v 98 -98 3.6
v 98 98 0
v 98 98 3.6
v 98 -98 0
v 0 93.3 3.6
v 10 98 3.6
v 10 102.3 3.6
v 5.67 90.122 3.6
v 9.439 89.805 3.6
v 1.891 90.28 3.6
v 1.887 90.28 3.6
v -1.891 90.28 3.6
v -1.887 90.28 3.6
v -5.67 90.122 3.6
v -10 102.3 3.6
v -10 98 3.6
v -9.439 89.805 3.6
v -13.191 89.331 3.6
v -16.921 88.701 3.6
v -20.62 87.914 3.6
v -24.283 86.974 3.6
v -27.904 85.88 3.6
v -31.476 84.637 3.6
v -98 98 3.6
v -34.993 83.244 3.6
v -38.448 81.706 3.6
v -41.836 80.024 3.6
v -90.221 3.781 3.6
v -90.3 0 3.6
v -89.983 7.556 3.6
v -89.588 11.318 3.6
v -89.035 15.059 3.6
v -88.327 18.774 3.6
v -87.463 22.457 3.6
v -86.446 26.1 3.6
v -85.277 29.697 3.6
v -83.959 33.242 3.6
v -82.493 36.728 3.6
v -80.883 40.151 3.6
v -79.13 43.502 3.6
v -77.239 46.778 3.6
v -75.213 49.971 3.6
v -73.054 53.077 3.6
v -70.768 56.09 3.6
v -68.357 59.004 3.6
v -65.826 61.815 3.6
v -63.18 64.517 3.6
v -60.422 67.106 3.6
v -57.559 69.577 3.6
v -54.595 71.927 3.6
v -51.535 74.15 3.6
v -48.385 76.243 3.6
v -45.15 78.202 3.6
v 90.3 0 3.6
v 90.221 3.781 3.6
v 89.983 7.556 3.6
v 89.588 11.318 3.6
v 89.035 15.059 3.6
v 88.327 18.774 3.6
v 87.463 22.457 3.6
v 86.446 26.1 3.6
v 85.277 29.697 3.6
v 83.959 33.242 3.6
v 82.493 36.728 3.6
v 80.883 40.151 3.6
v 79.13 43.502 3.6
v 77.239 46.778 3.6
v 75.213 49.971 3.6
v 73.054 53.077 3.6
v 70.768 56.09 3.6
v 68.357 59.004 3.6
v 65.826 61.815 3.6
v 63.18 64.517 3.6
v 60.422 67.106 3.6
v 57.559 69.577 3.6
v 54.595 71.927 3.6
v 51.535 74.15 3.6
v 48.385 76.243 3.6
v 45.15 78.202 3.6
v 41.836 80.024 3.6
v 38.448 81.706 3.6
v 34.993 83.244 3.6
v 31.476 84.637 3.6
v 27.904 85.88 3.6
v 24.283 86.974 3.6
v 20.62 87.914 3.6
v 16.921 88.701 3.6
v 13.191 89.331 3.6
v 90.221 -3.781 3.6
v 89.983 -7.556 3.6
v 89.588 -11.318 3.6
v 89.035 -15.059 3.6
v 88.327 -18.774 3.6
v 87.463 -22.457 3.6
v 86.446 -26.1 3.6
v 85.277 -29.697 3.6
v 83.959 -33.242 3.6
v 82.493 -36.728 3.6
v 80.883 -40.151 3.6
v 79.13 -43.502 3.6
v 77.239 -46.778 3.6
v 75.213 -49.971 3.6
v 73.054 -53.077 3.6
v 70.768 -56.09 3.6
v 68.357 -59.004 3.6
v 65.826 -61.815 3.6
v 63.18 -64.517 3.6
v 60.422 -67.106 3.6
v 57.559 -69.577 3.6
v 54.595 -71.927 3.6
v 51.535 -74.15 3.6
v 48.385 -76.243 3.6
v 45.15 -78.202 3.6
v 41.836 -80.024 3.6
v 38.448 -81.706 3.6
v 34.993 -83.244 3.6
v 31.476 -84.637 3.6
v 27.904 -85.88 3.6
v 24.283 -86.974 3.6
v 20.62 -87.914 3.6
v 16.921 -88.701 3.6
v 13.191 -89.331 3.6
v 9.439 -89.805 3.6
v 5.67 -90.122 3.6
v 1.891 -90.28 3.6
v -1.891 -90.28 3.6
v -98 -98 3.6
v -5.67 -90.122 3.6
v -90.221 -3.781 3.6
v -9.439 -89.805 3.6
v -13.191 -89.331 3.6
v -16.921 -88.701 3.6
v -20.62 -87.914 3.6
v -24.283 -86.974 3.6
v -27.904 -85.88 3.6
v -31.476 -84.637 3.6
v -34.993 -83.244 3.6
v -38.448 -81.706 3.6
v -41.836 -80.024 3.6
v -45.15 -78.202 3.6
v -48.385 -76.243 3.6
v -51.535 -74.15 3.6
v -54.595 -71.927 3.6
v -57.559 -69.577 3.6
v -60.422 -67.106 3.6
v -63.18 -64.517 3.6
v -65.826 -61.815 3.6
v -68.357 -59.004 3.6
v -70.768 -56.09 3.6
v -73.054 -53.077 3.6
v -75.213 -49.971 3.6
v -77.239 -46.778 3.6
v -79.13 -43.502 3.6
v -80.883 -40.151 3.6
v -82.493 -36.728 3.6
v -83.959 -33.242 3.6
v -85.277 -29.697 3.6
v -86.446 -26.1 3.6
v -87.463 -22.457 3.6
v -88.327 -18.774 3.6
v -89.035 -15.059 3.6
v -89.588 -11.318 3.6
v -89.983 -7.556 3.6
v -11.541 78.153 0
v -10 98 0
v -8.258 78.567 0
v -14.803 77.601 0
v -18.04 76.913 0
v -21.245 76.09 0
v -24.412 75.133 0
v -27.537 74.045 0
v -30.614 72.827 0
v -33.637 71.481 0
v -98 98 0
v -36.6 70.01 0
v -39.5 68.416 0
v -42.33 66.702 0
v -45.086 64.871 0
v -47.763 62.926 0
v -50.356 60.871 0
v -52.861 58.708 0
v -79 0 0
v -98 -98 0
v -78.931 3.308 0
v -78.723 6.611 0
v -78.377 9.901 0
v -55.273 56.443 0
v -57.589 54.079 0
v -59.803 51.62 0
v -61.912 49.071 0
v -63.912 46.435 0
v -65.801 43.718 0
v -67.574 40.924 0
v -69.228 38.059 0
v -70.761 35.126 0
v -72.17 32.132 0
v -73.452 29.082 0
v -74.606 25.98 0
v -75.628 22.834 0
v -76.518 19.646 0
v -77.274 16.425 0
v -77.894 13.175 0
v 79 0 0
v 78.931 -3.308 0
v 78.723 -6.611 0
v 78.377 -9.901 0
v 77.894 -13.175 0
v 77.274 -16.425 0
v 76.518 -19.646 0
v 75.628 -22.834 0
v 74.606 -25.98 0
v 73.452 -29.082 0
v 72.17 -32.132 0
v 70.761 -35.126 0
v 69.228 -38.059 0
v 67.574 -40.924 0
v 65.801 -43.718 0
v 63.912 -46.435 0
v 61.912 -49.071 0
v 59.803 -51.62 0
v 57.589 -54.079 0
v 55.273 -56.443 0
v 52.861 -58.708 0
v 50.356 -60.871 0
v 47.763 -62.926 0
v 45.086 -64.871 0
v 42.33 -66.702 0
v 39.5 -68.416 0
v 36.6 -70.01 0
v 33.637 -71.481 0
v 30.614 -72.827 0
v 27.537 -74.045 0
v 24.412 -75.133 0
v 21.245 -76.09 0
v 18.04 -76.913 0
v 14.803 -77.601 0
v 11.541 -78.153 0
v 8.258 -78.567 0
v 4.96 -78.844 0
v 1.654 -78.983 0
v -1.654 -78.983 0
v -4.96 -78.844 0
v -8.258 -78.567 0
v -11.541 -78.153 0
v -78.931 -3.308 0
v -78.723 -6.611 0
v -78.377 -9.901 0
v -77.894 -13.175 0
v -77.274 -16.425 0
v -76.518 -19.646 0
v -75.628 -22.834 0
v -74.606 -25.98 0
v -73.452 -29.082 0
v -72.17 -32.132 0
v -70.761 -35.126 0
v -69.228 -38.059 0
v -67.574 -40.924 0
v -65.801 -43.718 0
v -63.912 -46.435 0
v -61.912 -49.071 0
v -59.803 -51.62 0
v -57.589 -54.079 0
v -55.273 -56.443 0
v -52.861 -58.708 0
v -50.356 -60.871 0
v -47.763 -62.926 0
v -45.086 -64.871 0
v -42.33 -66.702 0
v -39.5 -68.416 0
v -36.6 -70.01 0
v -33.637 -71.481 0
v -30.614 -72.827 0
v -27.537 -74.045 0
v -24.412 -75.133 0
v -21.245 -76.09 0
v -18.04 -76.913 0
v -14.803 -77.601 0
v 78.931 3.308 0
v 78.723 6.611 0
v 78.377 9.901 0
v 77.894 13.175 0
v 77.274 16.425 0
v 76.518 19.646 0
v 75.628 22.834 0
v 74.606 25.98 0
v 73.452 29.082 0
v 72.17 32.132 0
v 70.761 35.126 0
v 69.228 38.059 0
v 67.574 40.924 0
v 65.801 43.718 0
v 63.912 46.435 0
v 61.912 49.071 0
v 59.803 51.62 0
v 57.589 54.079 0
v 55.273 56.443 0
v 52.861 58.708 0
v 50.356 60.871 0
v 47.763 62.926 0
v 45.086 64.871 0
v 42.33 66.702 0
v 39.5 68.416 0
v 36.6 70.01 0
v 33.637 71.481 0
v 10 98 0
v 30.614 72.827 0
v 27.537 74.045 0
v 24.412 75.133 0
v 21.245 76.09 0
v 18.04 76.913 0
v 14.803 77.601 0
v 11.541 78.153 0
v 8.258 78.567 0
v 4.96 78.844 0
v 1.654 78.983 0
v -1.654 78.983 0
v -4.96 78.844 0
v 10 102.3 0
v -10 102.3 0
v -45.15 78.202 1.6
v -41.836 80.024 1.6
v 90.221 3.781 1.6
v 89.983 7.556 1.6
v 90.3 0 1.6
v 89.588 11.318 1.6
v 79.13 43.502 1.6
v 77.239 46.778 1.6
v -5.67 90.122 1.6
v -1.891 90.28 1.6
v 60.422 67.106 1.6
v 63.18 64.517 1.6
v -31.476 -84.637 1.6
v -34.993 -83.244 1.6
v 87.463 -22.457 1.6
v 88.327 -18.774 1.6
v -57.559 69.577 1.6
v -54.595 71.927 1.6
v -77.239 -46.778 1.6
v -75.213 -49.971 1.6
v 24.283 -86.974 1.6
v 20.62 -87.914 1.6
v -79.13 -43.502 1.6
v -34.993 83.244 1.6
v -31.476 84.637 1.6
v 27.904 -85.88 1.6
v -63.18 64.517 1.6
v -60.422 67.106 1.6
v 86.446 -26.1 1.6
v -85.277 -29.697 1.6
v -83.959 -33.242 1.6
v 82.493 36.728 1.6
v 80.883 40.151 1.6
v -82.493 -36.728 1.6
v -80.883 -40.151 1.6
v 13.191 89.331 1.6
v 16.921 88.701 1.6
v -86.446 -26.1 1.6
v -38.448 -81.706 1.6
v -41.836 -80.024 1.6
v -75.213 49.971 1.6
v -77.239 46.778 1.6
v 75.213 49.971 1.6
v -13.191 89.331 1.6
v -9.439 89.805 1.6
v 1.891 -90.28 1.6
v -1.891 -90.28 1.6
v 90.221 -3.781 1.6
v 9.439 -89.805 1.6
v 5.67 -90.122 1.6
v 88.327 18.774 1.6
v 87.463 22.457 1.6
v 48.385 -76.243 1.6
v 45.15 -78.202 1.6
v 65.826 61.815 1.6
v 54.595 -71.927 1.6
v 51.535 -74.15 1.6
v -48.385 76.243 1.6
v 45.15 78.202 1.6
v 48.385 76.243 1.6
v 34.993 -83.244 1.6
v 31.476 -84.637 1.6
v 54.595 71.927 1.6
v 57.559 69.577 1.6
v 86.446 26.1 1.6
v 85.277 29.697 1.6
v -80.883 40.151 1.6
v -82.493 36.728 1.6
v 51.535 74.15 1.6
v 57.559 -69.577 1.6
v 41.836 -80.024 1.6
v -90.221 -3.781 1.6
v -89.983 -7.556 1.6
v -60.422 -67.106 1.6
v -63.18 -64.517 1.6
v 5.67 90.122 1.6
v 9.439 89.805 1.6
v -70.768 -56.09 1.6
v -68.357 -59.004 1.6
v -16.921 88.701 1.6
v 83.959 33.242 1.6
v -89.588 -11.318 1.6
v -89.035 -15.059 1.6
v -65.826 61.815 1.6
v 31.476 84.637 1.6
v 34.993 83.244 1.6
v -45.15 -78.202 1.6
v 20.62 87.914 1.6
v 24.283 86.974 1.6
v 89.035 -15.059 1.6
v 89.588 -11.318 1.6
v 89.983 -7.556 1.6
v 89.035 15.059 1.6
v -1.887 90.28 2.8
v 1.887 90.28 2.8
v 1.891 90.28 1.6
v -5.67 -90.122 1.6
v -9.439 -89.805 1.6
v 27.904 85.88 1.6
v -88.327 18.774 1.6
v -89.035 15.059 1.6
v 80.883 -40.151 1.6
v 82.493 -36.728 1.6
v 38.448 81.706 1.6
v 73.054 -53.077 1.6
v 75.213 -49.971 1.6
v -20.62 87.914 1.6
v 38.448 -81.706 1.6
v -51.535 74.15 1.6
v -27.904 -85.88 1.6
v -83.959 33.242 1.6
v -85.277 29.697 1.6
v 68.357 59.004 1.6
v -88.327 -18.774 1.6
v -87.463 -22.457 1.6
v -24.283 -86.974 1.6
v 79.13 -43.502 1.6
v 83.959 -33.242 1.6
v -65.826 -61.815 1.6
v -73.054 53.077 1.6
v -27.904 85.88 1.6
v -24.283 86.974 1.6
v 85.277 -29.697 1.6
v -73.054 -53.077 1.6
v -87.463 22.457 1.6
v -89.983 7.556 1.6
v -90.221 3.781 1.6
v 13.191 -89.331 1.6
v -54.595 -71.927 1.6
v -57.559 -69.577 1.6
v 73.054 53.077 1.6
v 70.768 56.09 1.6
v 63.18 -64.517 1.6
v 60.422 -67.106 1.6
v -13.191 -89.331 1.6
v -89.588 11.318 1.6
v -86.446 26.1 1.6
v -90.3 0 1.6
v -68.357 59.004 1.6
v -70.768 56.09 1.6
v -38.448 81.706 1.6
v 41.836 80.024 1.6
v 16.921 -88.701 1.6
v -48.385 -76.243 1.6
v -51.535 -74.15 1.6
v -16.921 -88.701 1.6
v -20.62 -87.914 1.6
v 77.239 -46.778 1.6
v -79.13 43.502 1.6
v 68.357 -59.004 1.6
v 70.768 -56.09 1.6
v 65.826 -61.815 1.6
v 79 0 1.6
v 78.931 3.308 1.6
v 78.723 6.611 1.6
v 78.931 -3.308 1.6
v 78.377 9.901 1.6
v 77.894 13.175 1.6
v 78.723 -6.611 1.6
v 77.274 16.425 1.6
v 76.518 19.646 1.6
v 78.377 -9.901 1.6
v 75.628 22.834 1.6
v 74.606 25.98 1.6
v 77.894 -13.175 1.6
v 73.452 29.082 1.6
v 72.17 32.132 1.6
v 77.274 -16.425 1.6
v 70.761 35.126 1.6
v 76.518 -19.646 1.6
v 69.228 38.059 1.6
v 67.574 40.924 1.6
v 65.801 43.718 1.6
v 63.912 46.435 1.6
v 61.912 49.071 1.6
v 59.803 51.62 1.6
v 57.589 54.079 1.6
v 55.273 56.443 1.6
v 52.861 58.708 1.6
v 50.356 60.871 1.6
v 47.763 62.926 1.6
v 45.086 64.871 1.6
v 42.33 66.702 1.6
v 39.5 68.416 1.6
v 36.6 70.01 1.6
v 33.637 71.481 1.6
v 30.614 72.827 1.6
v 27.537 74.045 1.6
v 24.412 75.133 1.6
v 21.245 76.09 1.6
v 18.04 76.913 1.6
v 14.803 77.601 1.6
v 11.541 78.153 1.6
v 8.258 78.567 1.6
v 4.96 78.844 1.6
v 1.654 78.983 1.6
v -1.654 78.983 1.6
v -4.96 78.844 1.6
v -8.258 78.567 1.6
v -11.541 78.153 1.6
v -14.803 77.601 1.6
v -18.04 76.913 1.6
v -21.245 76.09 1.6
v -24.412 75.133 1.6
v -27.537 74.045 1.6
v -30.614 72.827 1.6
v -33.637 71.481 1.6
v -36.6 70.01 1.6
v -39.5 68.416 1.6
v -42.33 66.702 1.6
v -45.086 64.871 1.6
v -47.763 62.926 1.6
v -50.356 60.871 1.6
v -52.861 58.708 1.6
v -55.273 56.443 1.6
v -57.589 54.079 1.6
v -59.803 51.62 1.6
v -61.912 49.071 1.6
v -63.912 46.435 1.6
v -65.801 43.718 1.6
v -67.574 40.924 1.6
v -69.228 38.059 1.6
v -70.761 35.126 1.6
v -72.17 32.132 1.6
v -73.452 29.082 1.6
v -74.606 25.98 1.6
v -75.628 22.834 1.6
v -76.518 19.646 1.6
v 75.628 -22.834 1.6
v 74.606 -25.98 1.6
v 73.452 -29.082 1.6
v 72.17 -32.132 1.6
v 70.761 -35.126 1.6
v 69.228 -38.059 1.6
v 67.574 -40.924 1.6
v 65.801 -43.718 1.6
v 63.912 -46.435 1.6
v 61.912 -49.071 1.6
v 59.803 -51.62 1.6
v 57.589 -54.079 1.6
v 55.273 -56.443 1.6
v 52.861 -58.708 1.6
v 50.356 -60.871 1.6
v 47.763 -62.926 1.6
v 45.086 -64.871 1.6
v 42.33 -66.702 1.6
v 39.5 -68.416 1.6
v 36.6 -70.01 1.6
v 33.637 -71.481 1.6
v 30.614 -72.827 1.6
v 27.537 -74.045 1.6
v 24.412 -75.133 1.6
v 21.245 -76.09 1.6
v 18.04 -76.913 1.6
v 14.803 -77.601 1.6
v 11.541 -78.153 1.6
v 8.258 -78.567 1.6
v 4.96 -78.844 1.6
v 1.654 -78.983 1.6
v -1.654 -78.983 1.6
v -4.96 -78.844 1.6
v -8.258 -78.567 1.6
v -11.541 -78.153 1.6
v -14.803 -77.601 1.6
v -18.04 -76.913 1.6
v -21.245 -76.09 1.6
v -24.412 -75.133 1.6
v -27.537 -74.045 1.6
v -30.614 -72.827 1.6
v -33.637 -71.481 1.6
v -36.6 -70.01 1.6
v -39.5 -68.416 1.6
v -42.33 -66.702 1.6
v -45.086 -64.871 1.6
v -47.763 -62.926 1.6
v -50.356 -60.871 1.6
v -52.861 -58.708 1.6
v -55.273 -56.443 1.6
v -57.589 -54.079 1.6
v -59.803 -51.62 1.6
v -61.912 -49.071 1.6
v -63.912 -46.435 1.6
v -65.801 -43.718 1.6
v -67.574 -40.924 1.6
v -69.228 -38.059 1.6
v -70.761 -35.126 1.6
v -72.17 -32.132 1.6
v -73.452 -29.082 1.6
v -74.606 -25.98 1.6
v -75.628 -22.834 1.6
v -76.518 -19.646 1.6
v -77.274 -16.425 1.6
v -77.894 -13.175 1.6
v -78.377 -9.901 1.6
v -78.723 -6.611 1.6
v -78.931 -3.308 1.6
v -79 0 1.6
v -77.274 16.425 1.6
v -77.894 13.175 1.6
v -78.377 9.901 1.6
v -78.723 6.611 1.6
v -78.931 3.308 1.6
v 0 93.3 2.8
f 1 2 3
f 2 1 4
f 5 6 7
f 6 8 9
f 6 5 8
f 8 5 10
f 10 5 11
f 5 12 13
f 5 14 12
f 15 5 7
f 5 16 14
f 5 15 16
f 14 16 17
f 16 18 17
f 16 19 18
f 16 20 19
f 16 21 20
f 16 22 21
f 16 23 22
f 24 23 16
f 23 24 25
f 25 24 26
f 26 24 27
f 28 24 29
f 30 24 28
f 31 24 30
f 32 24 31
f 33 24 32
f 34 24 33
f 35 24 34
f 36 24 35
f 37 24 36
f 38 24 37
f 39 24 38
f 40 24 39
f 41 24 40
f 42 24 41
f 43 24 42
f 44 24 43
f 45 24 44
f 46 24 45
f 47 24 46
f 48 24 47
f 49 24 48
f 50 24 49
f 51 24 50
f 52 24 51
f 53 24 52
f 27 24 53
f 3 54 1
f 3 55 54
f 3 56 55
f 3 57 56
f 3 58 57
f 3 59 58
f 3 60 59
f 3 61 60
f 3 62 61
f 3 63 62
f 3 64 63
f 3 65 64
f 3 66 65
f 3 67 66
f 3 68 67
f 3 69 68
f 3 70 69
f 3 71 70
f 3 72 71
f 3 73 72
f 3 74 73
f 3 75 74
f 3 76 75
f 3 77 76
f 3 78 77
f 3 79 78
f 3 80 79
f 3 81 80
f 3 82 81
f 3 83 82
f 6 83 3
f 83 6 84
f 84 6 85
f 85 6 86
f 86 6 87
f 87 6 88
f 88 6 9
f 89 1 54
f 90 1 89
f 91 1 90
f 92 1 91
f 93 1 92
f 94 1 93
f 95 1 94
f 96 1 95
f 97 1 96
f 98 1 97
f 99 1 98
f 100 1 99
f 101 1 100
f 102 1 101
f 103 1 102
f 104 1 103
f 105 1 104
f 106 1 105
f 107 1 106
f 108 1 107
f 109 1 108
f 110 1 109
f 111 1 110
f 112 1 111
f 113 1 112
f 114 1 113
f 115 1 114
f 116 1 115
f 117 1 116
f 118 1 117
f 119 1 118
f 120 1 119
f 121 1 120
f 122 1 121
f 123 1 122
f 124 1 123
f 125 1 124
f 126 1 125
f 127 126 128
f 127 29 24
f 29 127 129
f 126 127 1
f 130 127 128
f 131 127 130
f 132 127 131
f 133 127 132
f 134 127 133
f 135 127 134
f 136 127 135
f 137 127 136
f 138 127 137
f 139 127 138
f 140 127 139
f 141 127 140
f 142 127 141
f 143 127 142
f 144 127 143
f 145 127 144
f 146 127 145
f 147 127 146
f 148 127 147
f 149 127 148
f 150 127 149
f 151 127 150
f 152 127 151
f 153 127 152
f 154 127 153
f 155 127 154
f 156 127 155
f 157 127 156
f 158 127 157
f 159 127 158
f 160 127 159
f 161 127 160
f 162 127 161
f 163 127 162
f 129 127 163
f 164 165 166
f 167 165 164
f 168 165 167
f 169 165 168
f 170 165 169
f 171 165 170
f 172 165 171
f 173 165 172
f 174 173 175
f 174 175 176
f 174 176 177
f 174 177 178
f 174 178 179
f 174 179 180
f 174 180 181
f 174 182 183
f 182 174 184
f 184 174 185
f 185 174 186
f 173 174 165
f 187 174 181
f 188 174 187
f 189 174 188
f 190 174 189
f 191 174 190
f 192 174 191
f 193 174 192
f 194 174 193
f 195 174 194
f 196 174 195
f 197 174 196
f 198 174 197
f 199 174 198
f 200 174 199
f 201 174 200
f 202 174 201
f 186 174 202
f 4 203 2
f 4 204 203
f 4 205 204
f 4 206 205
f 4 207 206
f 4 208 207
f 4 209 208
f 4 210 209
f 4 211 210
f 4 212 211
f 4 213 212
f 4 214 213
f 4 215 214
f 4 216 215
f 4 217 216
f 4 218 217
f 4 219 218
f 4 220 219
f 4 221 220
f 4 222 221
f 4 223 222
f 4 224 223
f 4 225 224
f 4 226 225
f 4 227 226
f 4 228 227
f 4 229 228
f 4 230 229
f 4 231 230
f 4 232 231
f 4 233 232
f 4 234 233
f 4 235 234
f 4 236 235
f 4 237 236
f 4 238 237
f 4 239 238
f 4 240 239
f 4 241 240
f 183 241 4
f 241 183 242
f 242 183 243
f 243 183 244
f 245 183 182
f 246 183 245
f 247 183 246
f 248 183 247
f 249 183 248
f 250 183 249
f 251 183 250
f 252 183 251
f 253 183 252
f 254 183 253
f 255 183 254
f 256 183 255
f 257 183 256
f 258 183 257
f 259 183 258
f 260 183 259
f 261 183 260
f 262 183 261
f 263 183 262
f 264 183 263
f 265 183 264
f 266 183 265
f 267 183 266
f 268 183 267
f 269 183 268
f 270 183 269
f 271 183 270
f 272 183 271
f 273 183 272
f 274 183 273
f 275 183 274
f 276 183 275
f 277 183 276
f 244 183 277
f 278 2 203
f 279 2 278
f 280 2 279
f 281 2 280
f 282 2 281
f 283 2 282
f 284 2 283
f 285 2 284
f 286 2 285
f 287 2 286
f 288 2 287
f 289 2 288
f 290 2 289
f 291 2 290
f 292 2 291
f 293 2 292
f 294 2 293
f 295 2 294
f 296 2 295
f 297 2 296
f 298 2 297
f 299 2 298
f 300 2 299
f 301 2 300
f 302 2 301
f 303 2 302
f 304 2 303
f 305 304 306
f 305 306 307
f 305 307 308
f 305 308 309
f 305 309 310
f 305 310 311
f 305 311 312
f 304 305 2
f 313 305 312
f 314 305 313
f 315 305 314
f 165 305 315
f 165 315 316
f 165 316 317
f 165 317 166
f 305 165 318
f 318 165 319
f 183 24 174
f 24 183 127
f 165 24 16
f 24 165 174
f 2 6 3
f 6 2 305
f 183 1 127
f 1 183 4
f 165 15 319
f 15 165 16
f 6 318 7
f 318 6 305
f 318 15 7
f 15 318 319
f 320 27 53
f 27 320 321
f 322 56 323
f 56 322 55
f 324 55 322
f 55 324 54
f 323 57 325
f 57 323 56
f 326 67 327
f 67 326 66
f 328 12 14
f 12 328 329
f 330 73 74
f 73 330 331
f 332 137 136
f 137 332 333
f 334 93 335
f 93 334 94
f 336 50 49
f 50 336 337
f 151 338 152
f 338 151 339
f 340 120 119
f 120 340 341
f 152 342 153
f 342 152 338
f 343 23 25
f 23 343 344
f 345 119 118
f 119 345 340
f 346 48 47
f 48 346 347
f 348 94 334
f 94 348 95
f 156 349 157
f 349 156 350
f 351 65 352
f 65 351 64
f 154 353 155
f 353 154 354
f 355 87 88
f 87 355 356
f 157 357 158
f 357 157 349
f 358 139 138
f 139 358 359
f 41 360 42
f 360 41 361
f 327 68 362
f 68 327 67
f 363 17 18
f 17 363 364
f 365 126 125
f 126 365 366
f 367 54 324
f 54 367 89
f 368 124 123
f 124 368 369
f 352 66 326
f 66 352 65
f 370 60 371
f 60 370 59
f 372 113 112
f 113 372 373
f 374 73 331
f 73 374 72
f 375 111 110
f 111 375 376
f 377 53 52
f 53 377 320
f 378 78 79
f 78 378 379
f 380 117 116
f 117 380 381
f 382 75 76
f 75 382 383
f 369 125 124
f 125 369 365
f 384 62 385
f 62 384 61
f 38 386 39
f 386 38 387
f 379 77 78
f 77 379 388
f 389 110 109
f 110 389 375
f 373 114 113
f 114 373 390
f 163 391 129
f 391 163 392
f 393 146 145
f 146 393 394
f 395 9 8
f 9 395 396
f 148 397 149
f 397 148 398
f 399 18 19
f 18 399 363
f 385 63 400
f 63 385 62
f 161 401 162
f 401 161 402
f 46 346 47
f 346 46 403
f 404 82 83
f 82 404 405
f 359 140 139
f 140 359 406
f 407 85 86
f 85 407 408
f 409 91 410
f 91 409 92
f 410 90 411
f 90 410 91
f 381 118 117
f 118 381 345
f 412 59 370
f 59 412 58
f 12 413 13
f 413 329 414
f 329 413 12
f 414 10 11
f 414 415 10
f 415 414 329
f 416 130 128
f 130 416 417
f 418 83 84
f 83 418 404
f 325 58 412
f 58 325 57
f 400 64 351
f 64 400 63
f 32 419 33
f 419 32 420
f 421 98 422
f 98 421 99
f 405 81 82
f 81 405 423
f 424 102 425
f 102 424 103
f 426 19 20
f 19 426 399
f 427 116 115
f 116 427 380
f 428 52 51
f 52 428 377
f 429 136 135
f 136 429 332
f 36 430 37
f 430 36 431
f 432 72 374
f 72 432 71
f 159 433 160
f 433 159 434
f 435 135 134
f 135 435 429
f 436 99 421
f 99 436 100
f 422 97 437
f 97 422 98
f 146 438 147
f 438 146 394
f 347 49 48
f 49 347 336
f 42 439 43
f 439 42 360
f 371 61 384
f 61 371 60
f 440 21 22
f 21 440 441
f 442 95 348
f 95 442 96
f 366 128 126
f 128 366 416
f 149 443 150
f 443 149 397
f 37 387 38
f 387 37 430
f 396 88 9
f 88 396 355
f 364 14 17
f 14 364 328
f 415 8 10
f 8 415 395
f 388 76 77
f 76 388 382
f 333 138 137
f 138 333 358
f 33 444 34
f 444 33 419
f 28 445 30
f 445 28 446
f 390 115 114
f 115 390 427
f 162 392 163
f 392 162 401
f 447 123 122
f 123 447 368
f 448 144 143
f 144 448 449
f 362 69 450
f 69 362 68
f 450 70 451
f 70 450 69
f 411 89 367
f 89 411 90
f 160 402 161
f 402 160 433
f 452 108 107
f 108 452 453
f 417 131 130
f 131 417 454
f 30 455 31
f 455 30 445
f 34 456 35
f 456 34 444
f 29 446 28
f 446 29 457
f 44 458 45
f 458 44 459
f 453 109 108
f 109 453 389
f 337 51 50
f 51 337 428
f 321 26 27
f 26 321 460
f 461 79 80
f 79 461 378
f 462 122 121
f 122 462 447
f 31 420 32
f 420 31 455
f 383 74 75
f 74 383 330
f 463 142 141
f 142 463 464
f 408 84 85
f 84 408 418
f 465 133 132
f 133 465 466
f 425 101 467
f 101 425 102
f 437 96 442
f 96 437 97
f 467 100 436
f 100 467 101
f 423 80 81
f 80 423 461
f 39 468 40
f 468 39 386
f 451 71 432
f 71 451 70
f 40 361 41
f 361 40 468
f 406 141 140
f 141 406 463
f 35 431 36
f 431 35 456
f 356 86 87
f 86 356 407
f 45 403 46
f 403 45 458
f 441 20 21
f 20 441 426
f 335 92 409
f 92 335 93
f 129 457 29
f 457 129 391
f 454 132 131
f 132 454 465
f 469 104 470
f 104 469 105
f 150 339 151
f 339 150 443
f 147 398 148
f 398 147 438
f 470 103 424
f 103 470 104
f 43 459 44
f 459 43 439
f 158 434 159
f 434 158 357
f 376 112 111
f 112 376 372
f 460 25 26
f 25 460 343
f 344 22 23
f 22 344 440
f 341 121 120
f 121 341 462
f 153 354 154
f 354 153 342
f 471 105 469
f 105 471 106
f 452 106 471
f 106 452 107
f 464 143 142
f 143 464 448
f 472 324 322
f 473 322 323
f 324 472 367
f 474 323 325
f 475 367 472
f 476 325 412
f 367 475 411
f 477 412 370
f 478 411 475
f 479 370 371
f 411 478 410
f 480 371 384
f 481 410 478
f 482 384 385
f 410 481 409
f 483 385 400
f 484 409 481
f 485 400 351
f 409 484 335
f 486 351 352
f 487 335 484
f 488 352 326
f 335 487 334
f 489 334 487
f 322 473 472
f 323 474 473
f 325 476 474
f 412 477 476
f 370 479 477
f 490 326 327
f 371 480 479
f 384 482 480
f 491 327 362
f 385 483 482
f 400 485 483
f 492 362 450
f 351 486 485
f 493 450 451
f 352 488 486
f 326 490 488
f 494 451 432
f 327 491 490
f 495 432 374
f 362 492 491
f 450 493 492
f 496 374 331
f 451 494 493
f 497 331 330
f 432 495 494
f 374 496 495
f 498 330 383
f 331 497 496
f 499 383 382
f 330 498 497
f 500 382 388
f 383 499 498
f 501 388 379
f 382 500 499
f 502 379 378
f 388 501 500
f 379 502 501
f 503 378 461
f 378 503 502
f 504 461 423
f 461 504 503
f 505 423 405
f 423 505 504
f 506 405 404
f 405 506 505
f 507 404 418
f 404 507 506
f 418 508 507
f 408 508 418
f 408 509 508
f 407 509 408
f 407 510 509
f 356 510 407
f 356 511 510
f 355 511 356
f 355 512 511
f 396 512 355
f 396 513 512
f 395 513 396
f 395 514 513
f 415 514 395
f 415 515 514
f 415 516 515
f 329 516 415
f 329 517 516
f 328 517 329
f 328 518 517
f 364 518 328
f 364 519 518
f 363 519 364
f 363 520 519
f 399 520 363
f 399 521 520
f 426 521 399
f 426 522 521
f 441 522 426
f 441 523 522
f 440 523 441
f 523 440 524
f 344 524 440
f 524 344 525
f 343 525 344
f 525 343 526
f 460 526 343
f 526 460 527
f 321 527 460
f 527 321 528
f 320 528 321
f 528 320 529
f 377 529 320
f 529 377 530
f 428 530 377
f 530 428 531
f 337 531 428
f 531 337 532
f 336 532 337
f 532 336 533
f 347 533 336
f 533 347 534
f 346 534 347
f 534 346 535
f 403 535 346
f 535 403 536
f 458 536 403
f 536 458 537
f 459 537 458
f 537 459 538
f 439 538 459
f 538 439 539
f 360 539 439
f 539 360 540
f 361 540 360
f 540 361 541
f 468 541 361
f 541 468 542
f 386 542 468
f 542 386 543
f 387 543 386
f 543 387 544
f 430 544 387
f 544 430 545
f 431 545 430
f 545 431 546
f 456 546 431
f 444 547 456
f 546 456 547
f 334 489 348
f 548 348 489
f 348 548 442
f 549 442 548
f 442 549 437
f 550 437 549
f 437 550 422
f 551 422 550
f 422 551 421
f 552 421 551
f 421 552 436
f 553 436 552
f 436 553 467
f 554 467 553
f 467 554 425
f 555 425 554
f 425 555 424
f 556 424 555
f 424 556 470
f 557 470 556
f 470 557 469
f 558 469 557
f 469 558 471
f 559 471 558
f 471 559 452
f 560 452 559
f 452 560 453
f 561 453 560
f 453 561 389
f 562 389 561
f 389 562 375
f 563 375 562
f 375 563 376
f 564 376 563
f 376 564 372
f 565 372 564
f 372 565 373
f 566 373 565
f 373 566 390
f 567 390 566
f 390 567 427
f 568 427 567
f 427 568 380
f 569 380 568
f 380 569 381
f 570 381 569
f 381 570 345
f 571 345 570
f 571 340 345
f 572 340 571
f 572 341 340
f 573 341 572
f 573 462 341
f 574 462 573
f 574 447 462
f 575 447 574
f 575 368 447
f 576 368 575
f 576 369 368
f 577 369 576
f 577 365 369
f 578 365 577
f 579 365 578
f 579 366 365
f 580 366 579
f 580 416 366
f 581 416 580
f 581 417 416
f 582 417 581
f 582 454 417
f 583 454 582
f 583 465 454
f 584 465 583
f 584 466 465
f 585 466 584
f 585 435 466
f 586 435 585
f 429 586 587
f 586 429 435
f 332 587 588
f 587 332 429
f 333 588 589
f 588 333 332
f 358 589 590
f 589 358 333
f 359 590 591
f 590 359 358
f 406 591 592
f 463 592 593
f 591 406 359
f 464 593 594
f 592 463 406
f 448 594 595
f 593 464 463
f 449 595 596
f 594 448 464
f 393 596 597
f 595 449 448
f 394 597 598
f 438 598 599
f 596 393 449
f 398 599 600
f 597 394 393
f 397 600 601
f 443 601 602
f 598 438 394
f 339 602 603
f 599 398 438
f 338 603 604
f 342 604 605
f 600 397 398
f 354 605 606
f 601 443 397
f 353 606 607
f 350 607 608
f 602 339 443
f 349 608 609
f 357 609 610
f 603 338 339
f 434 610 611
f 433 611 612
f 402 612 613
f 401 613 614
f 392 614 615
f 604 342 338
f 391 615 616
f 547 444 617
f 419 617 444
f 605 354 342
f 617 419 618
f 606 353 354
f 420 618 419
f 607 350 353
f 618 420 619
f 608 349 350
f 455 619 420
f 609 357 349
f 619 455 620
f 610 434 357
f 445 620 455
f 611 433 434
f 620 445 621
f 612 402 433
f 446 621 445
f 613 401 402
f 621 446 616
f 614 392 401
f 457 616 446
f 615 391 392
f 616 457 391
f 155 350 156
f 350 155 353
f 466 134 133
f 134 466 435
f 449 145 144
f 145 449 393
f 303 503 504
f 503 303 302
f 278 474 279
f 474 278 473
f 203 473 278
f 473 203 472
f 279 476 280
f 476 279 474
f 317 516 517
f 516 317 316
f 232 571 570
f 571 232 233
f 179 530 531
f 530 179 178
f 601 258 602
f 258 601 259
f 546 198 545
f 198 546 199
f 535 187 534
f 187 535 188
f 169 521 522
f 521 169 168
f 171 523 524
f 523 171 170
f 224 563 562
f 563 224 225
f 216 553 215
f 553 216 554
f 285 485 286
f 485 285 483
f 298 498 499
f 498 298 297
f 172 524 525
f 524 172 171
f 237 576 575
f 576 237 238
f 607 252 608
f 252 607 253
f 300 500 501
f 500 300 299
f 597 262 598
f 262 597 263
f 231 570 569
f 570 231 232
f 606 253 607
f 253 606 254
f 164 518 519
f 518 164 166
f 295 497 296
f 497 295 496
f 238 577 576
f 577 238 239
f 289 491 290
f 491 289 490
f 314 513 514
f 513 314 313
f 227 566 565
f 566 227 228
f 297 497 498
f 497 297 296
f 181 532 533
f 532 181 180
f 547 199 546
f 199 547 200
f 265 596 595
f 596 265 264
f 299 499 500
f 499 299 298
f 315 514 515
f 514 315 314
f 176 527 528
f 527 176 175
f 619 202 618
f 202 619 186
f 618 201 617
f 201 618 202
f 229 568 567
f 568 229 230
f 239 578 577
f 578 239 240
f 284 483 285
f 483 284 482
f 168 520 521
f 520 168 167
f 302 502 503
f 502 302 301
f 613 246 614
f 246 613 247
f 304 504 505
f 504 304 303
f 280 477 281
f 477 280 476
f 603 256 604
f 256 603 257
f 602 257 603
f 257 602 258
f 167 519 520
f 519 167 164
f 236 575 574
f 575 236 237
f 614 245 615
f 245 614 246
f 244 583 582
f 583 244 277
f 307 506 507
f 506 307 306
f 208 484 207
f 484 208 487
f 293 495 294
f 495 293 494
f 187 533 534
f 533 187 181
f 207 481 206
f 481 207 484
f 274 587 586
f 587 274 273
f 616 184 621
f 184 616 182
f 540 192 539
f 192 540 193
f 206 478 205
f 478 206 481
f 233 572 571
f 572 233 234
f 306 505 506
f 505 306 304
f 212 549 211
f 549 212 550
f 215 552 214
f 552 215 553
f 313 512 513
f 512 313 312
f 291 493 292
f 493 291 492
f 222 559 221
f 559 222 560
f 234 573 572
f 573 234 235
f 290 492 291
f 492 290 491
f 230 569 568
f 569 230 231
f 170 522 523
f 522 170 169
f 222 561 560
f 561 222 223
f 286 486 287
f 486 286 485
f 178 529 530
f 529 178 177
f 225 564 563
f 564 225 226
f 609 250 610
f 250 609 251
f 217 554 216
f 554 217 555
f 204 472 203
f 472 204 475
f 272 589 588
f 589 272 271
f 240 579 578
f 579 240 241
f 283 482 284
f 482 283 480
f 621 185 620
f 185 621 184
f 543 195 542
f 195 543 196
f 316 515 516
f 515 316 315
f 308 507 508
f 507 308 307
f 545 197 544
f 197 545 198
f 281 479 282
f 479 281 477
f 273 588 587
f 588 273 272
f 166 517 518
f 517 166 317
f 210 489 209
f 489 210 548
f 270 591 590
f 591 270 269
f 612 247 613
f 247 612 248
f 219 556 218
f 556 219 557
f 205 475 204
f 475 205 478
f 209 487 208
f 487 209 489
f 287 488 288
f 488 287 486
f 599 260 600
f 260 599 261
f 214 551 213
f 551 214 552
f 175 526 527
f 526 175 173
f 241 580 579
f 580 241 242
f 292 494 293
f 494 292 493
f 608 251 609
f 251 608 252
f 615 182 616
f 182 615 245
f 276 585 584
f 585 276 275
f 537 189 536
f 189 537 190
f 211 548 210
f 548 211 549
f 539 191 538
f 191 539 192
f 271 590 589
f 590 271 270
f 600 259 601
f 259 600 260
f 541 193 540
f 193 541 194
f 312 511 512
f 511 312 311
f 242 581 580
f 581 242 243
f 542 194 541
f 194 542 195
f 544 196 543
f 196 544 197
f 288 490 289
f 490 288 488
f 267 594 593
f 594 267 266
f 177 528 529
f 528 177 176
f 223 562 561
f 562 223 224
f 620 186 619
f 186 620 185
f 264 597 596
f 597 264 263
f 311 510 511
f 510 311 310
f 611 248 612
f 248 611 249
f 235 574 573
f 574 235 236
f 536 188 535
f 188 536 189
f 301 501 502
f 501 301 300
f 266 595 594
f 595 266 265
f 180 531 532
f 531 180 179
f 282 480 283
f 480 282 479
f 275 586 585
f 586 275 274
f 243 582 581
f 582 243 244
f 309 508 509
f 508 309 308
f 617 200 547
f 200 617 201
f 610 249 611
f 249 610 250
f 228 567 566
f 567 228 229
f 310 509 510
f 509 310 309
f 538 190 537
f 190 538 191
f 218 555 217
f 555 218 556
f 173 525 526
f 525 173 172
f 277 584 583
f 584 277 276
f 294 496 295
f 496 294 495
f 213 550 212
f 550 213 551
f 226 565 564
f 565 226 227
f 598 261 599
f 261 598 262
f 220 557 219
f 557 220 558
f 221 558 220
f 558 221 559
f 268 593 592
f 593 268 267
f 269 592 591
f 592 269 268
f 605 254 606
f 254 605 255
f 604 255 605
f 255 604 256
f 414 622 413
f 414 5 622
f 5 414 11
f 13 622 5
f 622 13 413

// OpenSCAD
// ==========================================================
// Twist Art / Rotadraw / Doodle Disc Parametric Model
// Generated programmatically from vector paths.
// ==========================================================

// --- Customizer Parameters ---
part = "frame"; // ["disc", "frame", "both"]
disc_radius = 90.0;
disc_thickness = 2.0;
slot_width = 2.0;
clearance = .3; // Radial gap between disc and frame pocket

// --- Advanced Parameters ---
N = 48; // Number of rotational steps
notch_size = 1.0; // Radius of alignment notches on rim
rim_margin = 13.0; // Radial width of the numbers rim area
engrave_depth = 0.8;
font_name = "Liberation Sans:style=Bold";
font_size_rim = 4.5;
font_size_slot = 3.5;
theta_index = 90; // Index pointer angle (12 o'clock = 90 deg)

// Holder frame parameters
frame_thickness = disc_thickness + 1.6;
frame_width = (disc_radius + 8.0) * 2;
frame_height = (disc_radius + 8.0) * 2;
paper_width = (disc_radius + 4.0) * 2;
paper_height = 0;//(disc_radius + 4.0) * 2;

// --- Geometric Data ---

// Each slot is a list of polyline points, pre-rotated by their notch angle
slots = [
    [[-17.5130, 7.7232], [-15.6862, 7.6079], [-13.8594, 7.4926], [-12.0327, 7.3773], [-10.2059, 7.2619], [-8.3791, 7.1466], [-6.5523, 7.0313], [-4.7255, 6.9160], [-2.8987, 6.8006], [-2.3649, 6.7669]],
    [[7.1568, -0.4047], [6.5866, -1.5680], [5.7810, -3.2116], [7.9997, -4.7824], [9.9929, -6.6185], [11.7453, -8.6849], [13.2419, -10.9465], [13.7849, -12.0195]],
    [[18.2533, -1.1440], [19.6159, -1.7984], [21.9116, -3.2466], [24.0230, -4.9495], [25.9169, -6.8881], [27.5597, -9.0440], [28.9183, -11.3985], [28.9604, -11.4902]],
    [[-19.3353, 24.4310], [-19.1226, 26.6956], [-18.6500, 29.0283], [-17.9374, 31.3027], [-16.9953, 33.4931], [-15.8342, 35.5735], [-14.4644, 37.5181], [-13.8076, 38.2651]],
    [[-36.8209, 17.2941], [-36.9093, 18.6708], [-36.7962, 21.0404], [-36.4069, 23.3844], [-35.7307, 25.6772], [-35.1845, 27.0905], [-34.5381, 28.4600], [-33.7961, 29.7803], [-32.9634, 31.0455], [-32.5989, 31.5236]],
    [[-22.0122, -39.6470], [-22.8574, -39.2999], [-24.2156, -38.6289], [-25.5241, -37.8656], [-26.7761, -37.0132], [-27.9649, -36.0748], [-29.0838, -35.0536], [-29.5010, -34.9833], [-29.8945, -35.0076], [-30.2657, -35.1127], [-30.6164, -35.2850], [-30.9481, -35.5105], [-31.2624, -35.7754], [-31.5610, -36.0660], [-31.8454, -36.3684], [-32.1173, -36.6688], [-32.3782, -36.9534], [-32.6483, -37.2401], [-32.9335, -37.5088], [-33.2307, -37.7635], [-33.5363, -38.0085], [-33.8470, -38.2478], [-34.1594, -38.4854], [-34.4034, -38.6739]],
    [[23.2216, 46.2604], [23.2727, 46.3275], [23.5040, 46.6448], [23.7243, 46.9702], [23.9294, 47.3068], [24.5764, 48.2866], [25.2367, 49.2679], [25.9175, 50.2399], [26.6263, 51.1915], [27.3705, 52.1118], [28.1572, 52.9898], [28.9940, 53.8147], [29.8881, 54.5755], [30.8468, 55.2612], [31.8777, 55.8609], [33.4938, 56.6574], [33.7755, 56.7590]],
    [[32.2670, -57.6299], [32.0001, -59.1155], [31.4871, -60.8548], [30.7891, -62.5297], [29.9143, -64.1169], [28.8709, -65.5929], [27.6672, -66.9344], [26.3115, -68.1179], [24.8119, -69.1202], [23.8992, -69.5654]],
    [[14.0854, 72.1950], [14.8872, 72.1389], [16.4932, 71.8128], [18.0700, 71.3385], [19.6014, 70.7212], [21.0710, 69.9663], [22.4627, 69.0793], [23.7602, 68.0654], [24.9472, 66.9301], [26.0075, 65.6787], [26.6812, 64.6782]],
    [[-18.0108, -67.6075], [-18.2994, -67.2807], [-19.2425, -65.9248], [-19.7704, -64.8586], [-20.1799, -63.7282], [-20.4645, -62.5533], [-20.6177, -61.3532], [-20.6331, -60.1476], [-20.5043, -58.9560], [-20.2246, -57.7979], [-19.7877, -56.6928], [-19.1871, -55.6604], [-18.4163, -54.7201], [-17.5849, -54.0219]],
    [[-56.7324, 3.0038], [-56.7093, 2.9876], [-55.9208, 2.2186], [-55.2590, 1.3399], [-54.7262, 0.3727], [-54.3245, -0.6623], [-54.0564, -1.7440], [-53.9241, -2.8516], [-53.9298, -3.9640], [-54.0760, -5.0604], [-54.3649, -6.1197], [-55.0459, -7.4676], [-55.9734, -8.6452], [-57.1034, -9.6362], [-57.6797, -9.9887]],
    [[47.8488, -33.7226], [48.6602, -33.9182], [50.0538, -34.5080], [51.3300, -35.3143], [52.4461, -36.3175], [53.3590, -37.4981], [54.0261, -38.8364], [54.4044, -40.3129], [54.4273, -40.5734], [54.4273, -40.9115], [54.4193, -41.2934], [54.4178, -41.6852], [54.4377, -42.0531], [54.4937, -42.3631], [54.6005, -42.5814], [54.7728, -42.6742], [55.0254, -42.6075], [55.3731, -42.3475], [56.3361, -41.3786], [56.7827, -40.7746]],
    [[-66.9158, -20.2268], [-66.7481, -20.8108], [-66.1967, -22.0512], [-65.4849, -23.2084], [-64.6288, -24.2646], [-63.6445, -25.2023], [-62.5480, -26.0038], [-61.3554, -26.6513], [-60.0828, -27.1273], [-58.7462, -27.4140], [-57.3678, -27.5673], [-55.9982, -27.5756], [-55.0639, -27.4917]],
    [[51.0044, 34.4438], [50.5888, 34.3506], [49.2862, 33.9396], [48.0127, 33.4308], [46.7685, 32.8391], [45.5542, 32.1796], [44.3702, 31.4670], [43.2170, 30.7164], [42.0950, 29.9428], [41.5371, 29.5756], [40.9801, 29.2071], [40.4237, 28.8378], [39.8676, 28.4679], [39.3117, 28.0979], [38.7555, 27.7281], [38.1990, 27.3589], [37.8153, 27.1054]],
    [[-16.3944, 43.5422], [-16.3286, 43.3449], [-16.1186, 42.7110], [-15.9107, 42.0763], [-14.2139, 42.5537], [-12.4980, 42.9276], [-10.7664, 43.2080], [-9.0223, 43.4046], [-7.2689, 43.5272], [-5.5097, 43.5856], [-3.7479, 43.5897], [-2.4213, 43.5592]],
    [[36.5127, 23.8765], [36.7213, 23.4953], [37.5347, 21.9360], [38.3229, 20.3705], [39.1753, 18.3008], [39.8935, 16.1700], [40.4679, 13.9915], [40.8888, 11.7783], [41.1455, 9.5535]],
    [[35.8496, -22.3389], [35.8434, -22.3468], [34.3175, -23.9931], [32.6660, -25.5071], [30.8915, -26.8727], [28.9965, -28.0737], [26.9834, -29.0940], [25.1262, -29.8687], [23.2873, -30.4586]],
    [[-38.3408, 0.0670], [-38.3178, 0.1313], [-37.4980, 1.9502], [-36.5466, 3.7052], [-35.4768, 5.3955], [-34.3020, 7.0206], [-33.0358, 8.5798], [-31.6915, 10.0725], [-30.2826, 11.4980], [-29.4834, 12.2411]],
    [[-19.4549, -25.3105], [-19.8775, -24.5129], [-20.9744, -22.1816], [-21.9126, -19.7797], [-22.6875, -17.3194], [-23.2945, -14.8125], [-23.7291, -12.2711], [-23.8673, -10.8946]],
    [[-15.2224, -21.3686], [-15.9194, -20.3999], [-17.2724, -18.2082], [-18.4634, -15.9247], [-19.4824, -13.5575], [-20.3196, -11.1145], [-20.9410, -9.0537], [-21.3166, -7.5791]],
    [[16.7935, 15.1597], [17.1695, 14.6568], [18.3840, 12.8845], [19.5284, 11.0658], [20.6055, 9.2054], [21.6182, 7.3079], [22.5691, 5.3778], [23.4611, 3.4196], [24.1020, 1.9000]],
    [[15.6991, 18.3862], [16.1637, 18.1973], [18.1315, 17.3359], [19.7260, 19.1287], [21.3110, 20.9314], [22.8929, 22.7377], [24.4778, 24.5415], [26.0720, 26.3368], [26.4247, 26.7268]],
    [[-36.3585, 9.5211], [-38.1911, 9.9146], [-40.5308, 10.4478], [-42.8610, 11.0190], [-45.1796, 11.6364], [-47.4845, 12.3087], [-48.7096, 12.8712], [-49.8889, 13.5527], [-50.6996, 14.1289]],
    [[-26.7695, -45.3152], [-27.0580, -45.5538], [-28.1923, -46.3215], [-29.3943, -46.9694], [-30.6521, -47.4826], [-31.9539, -47.8463], [-33.2879, -48.0455], [-34.6421, -48.0656], [-36.0049, -47.8914], [-37.4976, -47.4424], [-38.8801, -46.7614], [-40.1371, -45.8758], [-40.6037, -45.4318]],
    [[57.5119, -20.1269], [57.1892, -20.9640], [56.4372, -22.3152], [55.5071, -23.5550], [54.4186, -24.6588], [53.1912, -25.6020], [51.8447, -26.3599], [50.3986, -26.9079], [48.6926, -27.4220], [46.9545, -27.7430], [45.5130, -27.8560]],
    [[51.1719, -15.1272], [50.8730, -15.2330], [49.1599, -15.6551], [47.4106, -15.9175], [45.6400, -16.0264], [43.8631, -15.9880], [42.0949, -15.8083], [40.3504, -15.4936], [38.6444, -15.0500], [36.4235, -14.3043], [36.3109, -14.2589]],
    [[15.5932, -35.7583], [14.7266, -33.7210], [13.9351, -31.5270], [13.2602, -29.2944], [12.6954, -27.0296], [12.2346, -24.7390], [11.8714, -22.4289], [11.7214, -21.1472]],
    [[12.4533, 20.7246], [11.6122, 20.0983], [9.6876, 18.7716], [7.7232, 17.5130], [7.7232, 17.5130], [5.9054, 17.7789], [5.0091, 17.6517], [4.1438, 17.3726], [3.3263, 16.9577], [2.5736, 16.4232], [1.9025, 15.7851], [1.3299, 15.0596], [0.8727, 14.2628], [0.5478, 13.4110], [0.2267, 12.3303], [0.2051, 12.2476]],
    [[3.3681, 11.7771], [2.8540, 10.8725], [2.3295, 9.8768], [1.8350, 8.8659], [1.3686, 7.8414], [0.9284, 6.8049], [0.5127, 5.7579], [0.1196, 4.7019], [-0.2528, 3.6385], [-0.6063, 2.5693], [-0.8070, 1.9623], [-1.0058, 1.3546], [-1.2037, 0.7467], [-1.4013, 0.1386], [-1.5996, -0.4693], [-1.7992, -1.0767], [-2.0010, -1.6833], [-2.2058, -2.2890], [-2.2105, -2.3025]],
    [[0.4810, -3.1554], [0.8257, -3.6768], [1.1741, -4.2129], [1.6741, -3.8491], [2.0986, -3.4267], [2.4601, -2.9555], [2.7707, -2.4455], [3.0430, -1.9067], [3.2892, -1.3491], [3.5218, -0.7826], [3.7530, -0.2172], [3.9952, 0.3371], [4.2607, 0.8704], [4.7683, 2.4929], [5.1326, 4.1664], [5.3472, 5.8717], [5.4057, 7.5899], [5.3441, 8.6060]],
    [[-4.1750, -9.2299], [-4.0423, -9.9145], [-3.5517, -11.5513], [-2.8932, -13.1214], [-2.0628, -14.6052], [-1.0568, -15.9828], [0.1287, -17.2345], [0.7023, -17.6845], [1.3320, -18.0575], [2.0057, -18.3502], [2.7111, -18.5588], [3.4359, -18.6798], [4.1679, -18.7096], [4.8947, -18.6446], [5.6043, -18.4811], [5.6817, -18.4509]],
    [[-18.8198, 4.3050], [-18.9174, 3.6655], [-18.9152, 2.9274], [-24.7232, 1.8368], [-27.6272, 1.2915], [-30.5312, 0.7462], [-33.4352, 0.2009], [-35.3756, -0.1635]],
    [[-35.0516, -4.7795], [-35.9833, -5.0847], [-38.7913, -6.0043], [-41.5993, -6.9240], [-44.4073, -7.8437], [-47.2153, -8.7634], [-46.5399, -10.2482], [-46.1315, -10.8745]],
    [[13.6482, 45.3883], [12.7876, 45.3417], [11.2151, 45.0284], [9.6951, 44.5075], [8.2458, 43.7975], [6.8853, 42.9169], [5.6316, 41.8842], [4.5027, 40.7179], [3.5168, 39.4364], [2.6918, 38.0584], [2.4691, 37.7149], [2.2749, 37.3590], [2.1050, 36.9925], [2.0373, 36.8229]],
    [[35.0409, -11.4983], [34.8636, -11.3658], [34.5294, -11.1375], [34.1873, -10.9190], [33.8405, -10.7068], [33.4917, -10.4972], [33.1440, -10.2867], [32.8001, -10.0715], [32.4680, -9.7831], [32.3533, -9.5315], [32.4189, -9.3136], [32.6274, -9.1262], [32.9415, -8.9661], [33.3240, -8.8301], [33.7377, -8.7149], [34.1451, -8.6175], [34.5091, -8.5346], [34.7923, -8.4629], [36.0069, -8.3199], [37.2213, -8.3266], [38.4238, -8.4751], [39.6029, -8.7574], [40.7470, -9.1656], [41.8444, -9.6917], [42.8836, -10.3279], [43.2912, -10.6384]],
    [[39.0627, -21.4805], [39.4945, -22.0391], [40.1366, -23.0730], [40.6665, -24.1660], [41.3715, -25.8410], [41.8934, -27.5723], [42.2376, -29.3448], [42.4091, -31.1436], [42.4135, -32.9536], [42.2559, -34.7598], [42.0517, -35.9213]],
    [[11.4943, -54.0977], [11.0259, -54.5274], [9.5888, -55.6352], [8.0655, -56.6154], [6.4693, -57.4594], [6.0426, -57.4893], [5.6637, -57.6107], [5.3352, -57.8107], [5.0597, -58.0767], [4.8397, -58.3957], [4.6779, -58.7552], [4.5768, -59.1423], [4.5390, -59.5444], [4.5671, -59.9486], [4.6638, -60.3422], [4.8622, -61.1335], [5.0453, -61.9288], [5.2159, -62.7272], [5.3771, -63.5281], [5.5318, -64.3307], [5.6828, -65.1343], [5.7236, -65.3520]],
    [[-14.2048, 64.0458], [-14.3900, 64.6125], [-14.6461, 65.3889], [-14.9073, 66.1632], [-15.1763, 66.9345], [-15.3483, 67.4455], [-15.5203, 67.9566], [-15.6923, 68.4676], [-15.8642, 68.9787], [-16.0359, 69.4898], [-16.2076, 70.0010], [-16.3791, 70.5121], [-16.5505, 71.0234], [-16.7218, 71.5347], [-16.8928, 72.0460], [-18.8804, 69.5671], [-20.8944, 67.0993], [-21.1322, 66.8083]],
    [[-15.1031, -68.4238], [-12.4718, -67.4271], [-9.4970, -66.2748], [-6.5427, -65.0776], [-3.6213, -63.8126], [-1.0856, -62.6176]],
    [[45.0449, 43.5097], [44.6912, 43.6369], [41.6606, 44.5910], [38.5841, 45.3993], [35.4546, 46.0367], [33.5559, 46.2025], [31.6563, 46.1654], [30.2225, 45.9886]],
    [[24.7161, -49.1678], [24.8930, -48.7504], [25.4551, -46.9372], [25.8369, -45.0766], [26.0367, -43.1870], [26.0529, -41.2864], [25.8837, -39.3934], [25.5276, -37.5260], [24.9829, -35.7026], [24.4695, -34.3767]],
    [[-12.3768, -40.3402], [-12.2509, -40.1333], [-11.5101, -38.6491], [-10.8930, -37.1116], [-10.3988, -35.5303], [-10.0267, -33.9147], [-9.7758, -32.2745], [-9.6454, -30.6192], [-9.6346, -28.9584], [-9.7426, -27.3017], [-9.9685, -25.6585], [-9.9696, -25.6520]],
    [[24.1313, -13.2325], [22.0827, -13.2926], [20.0347, -13.4644], [17.9989, -13.7456], [15.9807, -14.1341], [13.9853, -14.6276], [12.0180, -15.2240], [10.0839, -15.9212], [9.3498, -16.2294]],
    [[-17.3109, -7.1515], [-17.6427, -5.9363], [-18.2856, -3.9840], [-19.0283, -2.0680], [-19.0283, -2.0680], [-13.8663, 0.4705], [-11.2853, 1.7397], [-8.7043, 3.0089], [-7.6457, 3.5295]],
    [[2.9106, -7.9021], [1.3047, -7.3549], [-1.4179, -6.4274], [-4.1404, -5.4998], [-6.8629, -4.5722], [-9.5855, -3.6447], [-11.4568, -3.0071]],
    [[11.8447, -0.0606], [12.5919, -0.5610], [13.5202, 1.2522], [14.1598, 3.1657], [14.5207, 5.1466], [14.6126, 7.1620], [14.4455, 9.1791], [14.0294, 11.1651], [13.3742, 13.0871], [13.3264, 13.1858]],
    [[-7.2660, -17.2818], [-5.8323, -18.5567], [-4.1637, -19.7007], [-2.3638, -20.6145], [-1.3563, -21.0066], [-0.3165, -21.3177], [0.7466, -21.5434], [1.8241, -21.6794], [2.9070, -21.7213], [3.9863, -21.6647], [5.0530, -21.5054], [6.0982, -21.2388], [6.6203, -21.0443]],
    [[4.7888, 21.5350], [4.2704, 21.6224], [3.1789, 21.6822], [1.8098, 21.6497], [0.4669, 21.4812], [-0.8485, 21.1895], [-2.1353, 20.7876], [-3.3924, 20.2885], [-4.6187, 19.7052], [-5.8129, 19.0505], [-6.9741, 18.3376], [-8.1010, 17.5792], [-9.1924, 16.7885]],
];

// X, Y coordinate for each slot number text label on the disc face
label_positions = [
    [-9.6869, 11.2371],
    [11.9932, -3.0226],
    [27.3391, -2.6198],
    [-21.3942, 33.3894],
    [-39.8302, 25.9175],
    [-31.1167, -38.6137],
    [24.6658, 55.0874],
    [32.8114, -66.9480],
    [23.3869, 73.2337],
    [-24.6262, -60.7137],
    [-49.9289, -3.7875],
    [57.2685, -36.3748],
    [-60.4739, -22.5783],
    [46.3137, 27.9594],
    [-10.4467, 47.2693],
    [43.4145, 18.2473],
    [32.3107, -30.7089],
    [-37.8227, 8.9780],
    [-26.1879, -19.5207],
    [-22.6295, -16.3631],
    [24.3766, 10.6350],
    [18.3940, 23.6719],
    [-44.7754, 7.3894],
    [-33.6495, -52.0513],
    [54.7195, -29.3318],
    [43.2721, -19.9485],
    [9.2071, -29.5729],
    [5.9766, 13.7489],
    [3.9405, 3.5005],
    [0.5266, 2.3314],
    [1.8985, -13.2862],
    [-25.7266, -2.4215],
    [-41.0187, -10.9429],
    [9.2103, 39.6498],
    [36.2409, -4.3211],
    [45.9775, -27.6206],
    [7.8887, -60.9054],
    [-20.4158, 69.9691],
    [-9.5301, -61.9723],
    [36.9478, 41.6504],
    [22.0491, -41.7150],
    [-13.8723, -32.6013],
    [17.3513, -17.9437],
    [-17.5116, 3.1354],
    [-5.5631, -9.2409],
    [10.5532, 5.9500],
    [0.3151, -17.3315],
    [-1.1722, 16.8663],
];

// Which drawing step number (1 to N) is assigned to each notch index (0 to N-1)
rim_numbers = [26, 11, 13, 40, 6, 22, 18, 2, 29, 34, 28, 10, 3, 38, 8, 30, 19, 48, 46, 12, 20, 23, 1, 17, 32, 33, 44, 14, 42, 16, 7, 24, 4, 39, 9, 41, 37, 15, 5, 43, 31, 36, 27, 35, 45, 47, 25, 21];

// --- Assembly Render ---
if (part == "disc") {
    stencil_disc();
} else if (part == "frame") {
    holder_frame();
} else {
    // Render assembly: transparent disc sitting inside the frame
    color("LightBlue", 0.7) stencil_disc();
    color("Plum", 1.0) holder_frame();
}

// --- Modules ---

module draw_slot(points, w) {
    if (len(points) >= 2) {
        for (i = [0 : len(points) - 2]) {
            hull() {
                translate(points[i]) circle(d = w, $fn = 12);
                translate(points[i+1]) circle(d = w, $fn = 12);
            }
        }
    }
}

module stencil_disc() {
    difference() {
        // Base disc
        cylinder(r = disc_radius, h = disc_thickness, $fn = 150);
        
        // Subtract notches around the rim (triangles)
        for (m = [0 : N - 1]) {
            rotate([0, 0, m * 360 / N])
                translate([disc_radius, 0, -1])
                    cylinder(r = notch_size, h = disc_thickness + 2, $fn = 3);
        }
        
        // Subtract tracing slots
        for (i = [0 : len(slots) - 1]) {
            translate([0, 0, -1])
                linear_extrude(height = disc_thickness + 2)
                    draw_slot(slots[i], slot_width);
        }
        
        // Subtract rim numbers (engraved)
        for (m = [0 : N - 1]) {
            if (rim_numbers[m] > 0) {
                rotate([0, 0, m * 360 / N])
                    translate([disc_radius - rim_margin + 5.0, 0, disc_thickness - engrave_depth])
                        rotate([0, 0, -90]) // radial orientation
                            linear_extrude(height = engrave_depth + 0.1)
                                text(text = str(rim_numbers[m]), font = font_name, size = font_size_rim, halign = "center", valign = "center");
            }
        }
        
        // Subtract slot labels on the disc (engraved)
        for (i = [0 : len(label_positions) - 1]) {
            translate([label_positions[i][0], label_positions[i][1], disc_thickness - engrave_depth])
                linear_extrude(height = engrave_depth + 0.1)
                    text(text = str(i + 1), font = font_name, size = font_size_slot, halign = "center", valign = "center");
        }
        
        // Center label (Title & Step Count)
        translate([0, 0, disc_thickness - engrave_depth])
            linear_extrude(height = engrave_depth + 0.1) {
                translate([0, 3.5, 0])
                    text(text = "DOODLE", font = font_name, size = 6.0, halign = "center", valign = "center");
                translate([0, -3.5, 0])
                    text(text = str(N), font = font_name, size = 8.0, halign = "center", valign = "center");
            }
    }
}

module holder_frame() {
    difference() {
        // Outer square frame with index tab
        union() {
            translate([-frame_width/2, -frame_height/2, 0])
                cube([frame_width, frame_height, frame_thickness]);
            
            // tab for index pointer
            rotate([0, 0, theta_index])
                translate([disc_radius + clearance, -10.0, 0])
                    cube([12.0, 20.0, frame_thickness]);
        }
        
        // Circular recess pocket for the disc
        translate([0, 0, frame_thickness - disc_thickness])
            cylinder(r = disc_radius + clearance, h = disc_thickness + 1.0, $fn = 150);
        
        // Center drawing window opening
        translate([0, 0, -1])
            cylinder(r = disc_radius - rim_margin + 2.0, h = frame_thickness + 2.0, $fn = 150);
            
        // Paper alignment recess on underside
        translate([-paper_width/2, -paper_height/2, -0.1])
            cube([paper_width, paper_height, 0.7]);
            
        // Index arrow on the tab
        rotate([0, 0, theta_index])
            translate([disc_radius + clearance + 3.0, 0, frame_thickness - engrave_depth])
                linear_extrude(height = engrave_depth + 0.1)
                    polygon(points = [[-4.0, -2.5], [0.0, 0.0], [-4.0, 2.5]]);
    }
}
